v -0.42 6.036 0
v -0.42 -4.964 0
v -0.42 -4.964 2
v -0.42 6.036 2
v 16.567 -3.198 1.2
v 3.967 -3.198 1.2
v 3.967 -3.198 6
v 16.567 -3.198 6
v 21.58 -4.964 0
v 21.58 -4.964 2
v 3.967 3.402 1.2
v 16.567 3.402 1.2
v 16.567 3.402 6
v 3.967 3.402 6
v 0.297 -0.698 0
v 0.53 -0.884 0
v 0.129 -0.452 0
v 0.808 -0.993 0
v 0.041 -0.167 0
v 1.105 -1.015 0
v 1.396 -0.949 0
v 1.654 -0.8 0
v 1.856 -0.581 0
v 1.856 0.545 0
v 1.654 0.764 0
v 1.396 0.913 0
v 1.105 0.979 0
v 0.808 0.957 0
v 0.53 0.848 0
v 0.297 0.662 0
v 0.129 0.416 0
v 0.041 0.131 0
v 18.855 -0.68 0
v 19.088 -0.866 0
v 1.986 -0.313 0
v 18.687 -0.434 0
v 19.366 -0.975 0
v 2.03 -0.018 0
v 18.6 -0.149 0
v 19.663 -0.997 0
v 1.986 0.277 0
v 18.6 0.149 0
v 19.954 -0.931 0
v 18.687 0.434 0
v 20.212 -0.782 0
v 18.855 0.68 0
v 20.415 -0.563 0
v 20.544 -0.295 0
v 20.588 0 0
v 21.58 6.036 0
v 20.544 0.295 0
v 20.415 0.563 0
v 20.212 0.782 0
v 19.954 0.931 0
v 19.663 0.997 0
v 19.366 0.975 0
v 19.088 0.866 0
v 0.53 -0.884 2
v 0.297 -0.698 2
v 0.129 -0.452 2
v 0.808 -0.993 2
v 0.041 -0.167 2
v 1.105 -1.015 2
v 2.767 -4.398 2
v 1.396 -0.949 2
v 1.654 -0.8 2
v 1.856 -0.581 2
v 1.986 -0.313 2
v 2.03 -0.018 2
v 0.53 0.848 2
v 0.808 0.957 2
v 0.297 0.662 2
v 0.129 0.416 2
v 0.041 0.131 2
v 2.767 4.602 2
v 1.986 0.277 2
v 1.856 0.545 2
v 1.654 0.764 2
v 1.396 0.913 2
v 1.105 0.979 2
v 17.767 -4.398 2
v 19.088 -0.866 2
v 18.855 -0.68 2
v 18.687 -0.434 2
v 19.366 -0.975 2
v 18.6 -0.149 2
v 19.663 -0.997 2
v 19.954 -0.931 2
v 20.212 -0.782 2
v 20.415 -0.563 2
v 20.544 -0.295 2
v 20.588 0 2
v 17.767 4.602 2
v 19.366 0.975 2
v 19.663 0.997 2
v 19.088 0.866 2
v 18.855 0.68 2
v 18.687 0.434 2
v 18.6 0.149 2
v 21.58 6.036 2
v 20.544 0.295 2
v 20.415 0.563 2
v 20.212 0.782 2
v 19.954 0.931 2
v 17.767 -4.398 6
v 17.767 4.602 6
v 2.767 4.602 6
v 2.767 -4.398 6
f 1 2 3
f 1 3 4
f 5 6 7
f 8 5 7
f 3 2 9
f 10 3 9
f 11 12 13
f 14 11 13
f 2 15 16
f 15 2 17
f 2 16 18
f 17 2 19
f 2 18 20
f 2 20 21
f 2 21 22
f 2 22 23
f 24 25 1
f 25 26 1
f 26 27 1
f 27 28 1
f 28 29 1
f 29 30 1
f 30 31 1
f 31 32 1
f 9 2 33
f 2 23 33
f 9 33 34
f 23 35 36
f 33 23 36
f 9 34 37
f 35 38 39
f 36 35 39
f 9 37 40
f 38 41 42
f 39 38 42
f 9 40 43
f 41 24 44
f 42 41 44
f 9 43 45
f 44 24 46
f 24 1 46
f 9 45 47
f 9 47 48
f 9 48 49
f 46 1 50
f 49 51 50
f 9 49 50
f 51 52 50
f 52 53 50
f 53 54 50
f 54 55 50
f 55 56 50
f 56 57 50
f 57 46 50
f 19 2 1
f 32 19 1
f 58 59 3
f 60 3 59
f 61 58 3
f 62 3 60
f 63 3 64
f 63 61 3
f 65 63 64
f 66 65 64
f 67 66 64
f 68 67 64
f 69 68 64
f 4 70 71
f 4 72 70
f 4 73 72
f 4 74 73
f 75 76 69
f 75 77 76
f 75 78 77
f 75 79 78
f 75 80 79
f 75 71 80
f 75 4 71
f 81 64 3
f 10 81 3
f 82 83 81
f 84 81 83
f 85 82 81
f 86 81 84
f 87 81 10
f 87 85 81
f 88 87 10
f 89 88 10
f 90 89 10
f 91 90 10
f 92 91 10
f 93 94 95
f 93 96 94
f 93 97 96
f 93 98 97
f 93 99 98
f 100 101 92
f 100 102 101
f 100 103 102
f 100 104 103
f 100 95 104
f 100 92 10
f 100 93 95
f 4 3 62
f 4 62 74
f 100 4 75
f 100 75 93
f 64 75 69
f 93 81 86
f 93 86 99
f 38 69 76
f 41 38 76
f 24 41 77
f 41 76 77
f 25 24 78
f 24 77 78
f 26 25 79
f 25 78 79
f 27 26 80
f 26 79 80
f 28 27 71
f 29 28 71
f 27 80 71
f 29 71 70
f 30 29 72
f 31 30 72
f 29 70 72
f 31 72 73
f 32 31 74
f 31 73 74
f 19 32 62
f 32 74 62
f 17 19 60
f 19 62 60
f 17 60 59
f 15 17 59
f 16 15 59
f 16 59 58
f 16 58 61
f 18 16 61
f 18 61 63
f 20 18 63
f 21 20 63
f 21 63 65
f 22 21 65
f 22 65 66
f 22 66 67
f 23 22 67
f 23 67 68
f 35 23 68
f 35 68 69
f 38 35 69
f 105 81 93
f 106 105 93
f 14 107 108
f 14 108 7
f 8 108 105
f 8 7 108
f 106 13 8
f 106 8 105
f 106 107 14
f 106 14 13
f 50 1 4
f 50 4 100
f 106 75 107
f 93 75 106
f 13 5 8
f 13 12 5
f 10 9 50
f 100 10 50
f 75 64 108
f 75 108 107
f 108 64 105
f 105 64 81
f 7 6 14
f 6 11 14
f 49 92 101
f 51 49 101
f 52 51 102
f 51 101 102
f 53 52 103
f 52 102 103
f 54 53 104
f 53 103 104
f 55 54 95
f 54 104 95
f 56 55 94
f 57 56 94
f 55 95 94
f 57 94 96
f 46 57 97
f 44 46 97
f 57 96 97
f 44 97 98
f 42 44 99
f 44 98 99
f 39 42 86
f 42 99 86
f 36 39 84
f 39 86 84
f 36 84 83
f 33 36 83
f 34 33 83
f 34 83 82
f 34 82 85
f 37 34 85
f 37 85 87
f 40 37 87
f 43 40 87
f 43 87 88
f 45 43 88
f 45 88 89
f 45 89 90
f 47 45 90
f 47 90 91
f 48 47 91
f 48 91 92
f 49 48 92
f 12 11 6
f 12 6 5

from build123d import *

# Parameters (mm, degrees)
F0_W        = 22
F0_H        = 11
F1_DEPTH    = 2
F2_W        = 15
F2_H        = 9
F3_DEPTH    = 6
F4_T        = 1.2
F4_T3_DEPTH = 17.4
F4_T5_DEPTH = 11.4
F6_R        = 1
F7_DEPTH    = 25
F5_R        = 1
F8_DEPTH    = 25


# Not quite as in the source:
# - a shell that OpenCascade refuses in one call is made with other operations: the cavity is built on its own and cut out


with BuildPart() as f1:
    # F0 (on Top) → F1 (new body)
    with BuildSketch(Plane.XY):
        with Locations((10.5796571493, 0.5358164497)):
            Rectangle(F0_W, F0_H)
    extrude(amount=F1_DEPTH)

    # F2 (on Top) → F3 (join)
    with BuildSketch(Plane.XY):
        with Locations((10.2674138546, 0.1021951512)):
            Rectangle(F2_W, F2_H)
    extrude(amount=F3_DEPTH)

    # F4: shell of thickness 1.2, made by hand


with BuildPart() as f4_core1:
    # F4_t2: copy of F1
    add(f1.part)

    # the walls: a layer under each face that stays
    f4_faces = [f4_core1.faces().sort_by_distance(p)[0] for p in [
        (10.5796571493, -4.9641835503, 1),
        (-0.4203428507, 0.5358164497, 1),
        (21.5796571493, 0.5358164497, 1),
        (10.5796571493, 0.5358164497, 0),
        (17.9129904826, -3.130850217, 2),
        (10.5796571493, 6.0358164497, 1),
        (10.2674138546, -4.3978048488, 4),
        (17.7674138546, 0.1021951512, 4),
        (10.2674138546, 4.6021951512, 4),
        (2.7674138546, 0.1021951512, 4),
    ]]
    thicken(f4_faces, amount=-F4_T, mode=Mode.SUBTRACT)

    # F4_s4 → F4_t3 (cut)
    with BuildSketch(Plane.YZ.offset(1.5674138546)):
        Polygon((-4.4098048488, 2.012), (-4.3978048488, 0.8), (-3.1978048488, 0.8), (-3.1978048488, 2), align=None)
        Polygon((4.6141951512, 2.012), (4.6021951512, 0.8), (3.4021951512, 0.8), (3.4021951512, 2), align=None)
    extrude(amount=F4_T3_DEPTH, mode=Mode.SUBTRACT)

    # F4_s6 → F4_t5 (cut)
    with BuildSketch(Plane.XZ.offset(-5.8021951512)):
        Polygon((17.7794138546, 2.012), (17.7674138546, 0.8), (16.5674138546, 0.8), (16.5674138546, 2), align=None)
        Polygon((2.7554138546, 2.012), (2.7674138546, 0.8), (3.9674138546, 0.8), (3.9674138546, 2), align=None)
    extrude(amount=F4_T5_DEPTH, mode=Mode.SUBTRACT)


with BuildPart() as f1_1:
    add(f1.part)

    # what is left inside the walls is the cavity
    f4_cavity = [f4_core1.part.solids().sort_by_distance(p)[0] for p in [
        (10.267414, -0.997805, 1.212),
    ]]
    add(f4_cavity, mode=Mode.SUBTRACT)

    # F6 (on face) → F7 (cut)
    with BuildSketch(Plane.XY.offset(2)):
        with Locations((19.5883829147, 0)):
            Circle(F6_R)
    extrude(amount=-F7_DEPTH, mode=Mode.SUBTRACT)

    # F5 (on face) → F8 (cut)
    with BuildSketch(Plane.XY.offset(2)):
        with Locations((1.0301771374, -0.018063417)):
            Circle(F5_R)
    extrude(amount=-F8_DEPTH, mode=Mode.SUBTRACT)


solid = f1_1.part
